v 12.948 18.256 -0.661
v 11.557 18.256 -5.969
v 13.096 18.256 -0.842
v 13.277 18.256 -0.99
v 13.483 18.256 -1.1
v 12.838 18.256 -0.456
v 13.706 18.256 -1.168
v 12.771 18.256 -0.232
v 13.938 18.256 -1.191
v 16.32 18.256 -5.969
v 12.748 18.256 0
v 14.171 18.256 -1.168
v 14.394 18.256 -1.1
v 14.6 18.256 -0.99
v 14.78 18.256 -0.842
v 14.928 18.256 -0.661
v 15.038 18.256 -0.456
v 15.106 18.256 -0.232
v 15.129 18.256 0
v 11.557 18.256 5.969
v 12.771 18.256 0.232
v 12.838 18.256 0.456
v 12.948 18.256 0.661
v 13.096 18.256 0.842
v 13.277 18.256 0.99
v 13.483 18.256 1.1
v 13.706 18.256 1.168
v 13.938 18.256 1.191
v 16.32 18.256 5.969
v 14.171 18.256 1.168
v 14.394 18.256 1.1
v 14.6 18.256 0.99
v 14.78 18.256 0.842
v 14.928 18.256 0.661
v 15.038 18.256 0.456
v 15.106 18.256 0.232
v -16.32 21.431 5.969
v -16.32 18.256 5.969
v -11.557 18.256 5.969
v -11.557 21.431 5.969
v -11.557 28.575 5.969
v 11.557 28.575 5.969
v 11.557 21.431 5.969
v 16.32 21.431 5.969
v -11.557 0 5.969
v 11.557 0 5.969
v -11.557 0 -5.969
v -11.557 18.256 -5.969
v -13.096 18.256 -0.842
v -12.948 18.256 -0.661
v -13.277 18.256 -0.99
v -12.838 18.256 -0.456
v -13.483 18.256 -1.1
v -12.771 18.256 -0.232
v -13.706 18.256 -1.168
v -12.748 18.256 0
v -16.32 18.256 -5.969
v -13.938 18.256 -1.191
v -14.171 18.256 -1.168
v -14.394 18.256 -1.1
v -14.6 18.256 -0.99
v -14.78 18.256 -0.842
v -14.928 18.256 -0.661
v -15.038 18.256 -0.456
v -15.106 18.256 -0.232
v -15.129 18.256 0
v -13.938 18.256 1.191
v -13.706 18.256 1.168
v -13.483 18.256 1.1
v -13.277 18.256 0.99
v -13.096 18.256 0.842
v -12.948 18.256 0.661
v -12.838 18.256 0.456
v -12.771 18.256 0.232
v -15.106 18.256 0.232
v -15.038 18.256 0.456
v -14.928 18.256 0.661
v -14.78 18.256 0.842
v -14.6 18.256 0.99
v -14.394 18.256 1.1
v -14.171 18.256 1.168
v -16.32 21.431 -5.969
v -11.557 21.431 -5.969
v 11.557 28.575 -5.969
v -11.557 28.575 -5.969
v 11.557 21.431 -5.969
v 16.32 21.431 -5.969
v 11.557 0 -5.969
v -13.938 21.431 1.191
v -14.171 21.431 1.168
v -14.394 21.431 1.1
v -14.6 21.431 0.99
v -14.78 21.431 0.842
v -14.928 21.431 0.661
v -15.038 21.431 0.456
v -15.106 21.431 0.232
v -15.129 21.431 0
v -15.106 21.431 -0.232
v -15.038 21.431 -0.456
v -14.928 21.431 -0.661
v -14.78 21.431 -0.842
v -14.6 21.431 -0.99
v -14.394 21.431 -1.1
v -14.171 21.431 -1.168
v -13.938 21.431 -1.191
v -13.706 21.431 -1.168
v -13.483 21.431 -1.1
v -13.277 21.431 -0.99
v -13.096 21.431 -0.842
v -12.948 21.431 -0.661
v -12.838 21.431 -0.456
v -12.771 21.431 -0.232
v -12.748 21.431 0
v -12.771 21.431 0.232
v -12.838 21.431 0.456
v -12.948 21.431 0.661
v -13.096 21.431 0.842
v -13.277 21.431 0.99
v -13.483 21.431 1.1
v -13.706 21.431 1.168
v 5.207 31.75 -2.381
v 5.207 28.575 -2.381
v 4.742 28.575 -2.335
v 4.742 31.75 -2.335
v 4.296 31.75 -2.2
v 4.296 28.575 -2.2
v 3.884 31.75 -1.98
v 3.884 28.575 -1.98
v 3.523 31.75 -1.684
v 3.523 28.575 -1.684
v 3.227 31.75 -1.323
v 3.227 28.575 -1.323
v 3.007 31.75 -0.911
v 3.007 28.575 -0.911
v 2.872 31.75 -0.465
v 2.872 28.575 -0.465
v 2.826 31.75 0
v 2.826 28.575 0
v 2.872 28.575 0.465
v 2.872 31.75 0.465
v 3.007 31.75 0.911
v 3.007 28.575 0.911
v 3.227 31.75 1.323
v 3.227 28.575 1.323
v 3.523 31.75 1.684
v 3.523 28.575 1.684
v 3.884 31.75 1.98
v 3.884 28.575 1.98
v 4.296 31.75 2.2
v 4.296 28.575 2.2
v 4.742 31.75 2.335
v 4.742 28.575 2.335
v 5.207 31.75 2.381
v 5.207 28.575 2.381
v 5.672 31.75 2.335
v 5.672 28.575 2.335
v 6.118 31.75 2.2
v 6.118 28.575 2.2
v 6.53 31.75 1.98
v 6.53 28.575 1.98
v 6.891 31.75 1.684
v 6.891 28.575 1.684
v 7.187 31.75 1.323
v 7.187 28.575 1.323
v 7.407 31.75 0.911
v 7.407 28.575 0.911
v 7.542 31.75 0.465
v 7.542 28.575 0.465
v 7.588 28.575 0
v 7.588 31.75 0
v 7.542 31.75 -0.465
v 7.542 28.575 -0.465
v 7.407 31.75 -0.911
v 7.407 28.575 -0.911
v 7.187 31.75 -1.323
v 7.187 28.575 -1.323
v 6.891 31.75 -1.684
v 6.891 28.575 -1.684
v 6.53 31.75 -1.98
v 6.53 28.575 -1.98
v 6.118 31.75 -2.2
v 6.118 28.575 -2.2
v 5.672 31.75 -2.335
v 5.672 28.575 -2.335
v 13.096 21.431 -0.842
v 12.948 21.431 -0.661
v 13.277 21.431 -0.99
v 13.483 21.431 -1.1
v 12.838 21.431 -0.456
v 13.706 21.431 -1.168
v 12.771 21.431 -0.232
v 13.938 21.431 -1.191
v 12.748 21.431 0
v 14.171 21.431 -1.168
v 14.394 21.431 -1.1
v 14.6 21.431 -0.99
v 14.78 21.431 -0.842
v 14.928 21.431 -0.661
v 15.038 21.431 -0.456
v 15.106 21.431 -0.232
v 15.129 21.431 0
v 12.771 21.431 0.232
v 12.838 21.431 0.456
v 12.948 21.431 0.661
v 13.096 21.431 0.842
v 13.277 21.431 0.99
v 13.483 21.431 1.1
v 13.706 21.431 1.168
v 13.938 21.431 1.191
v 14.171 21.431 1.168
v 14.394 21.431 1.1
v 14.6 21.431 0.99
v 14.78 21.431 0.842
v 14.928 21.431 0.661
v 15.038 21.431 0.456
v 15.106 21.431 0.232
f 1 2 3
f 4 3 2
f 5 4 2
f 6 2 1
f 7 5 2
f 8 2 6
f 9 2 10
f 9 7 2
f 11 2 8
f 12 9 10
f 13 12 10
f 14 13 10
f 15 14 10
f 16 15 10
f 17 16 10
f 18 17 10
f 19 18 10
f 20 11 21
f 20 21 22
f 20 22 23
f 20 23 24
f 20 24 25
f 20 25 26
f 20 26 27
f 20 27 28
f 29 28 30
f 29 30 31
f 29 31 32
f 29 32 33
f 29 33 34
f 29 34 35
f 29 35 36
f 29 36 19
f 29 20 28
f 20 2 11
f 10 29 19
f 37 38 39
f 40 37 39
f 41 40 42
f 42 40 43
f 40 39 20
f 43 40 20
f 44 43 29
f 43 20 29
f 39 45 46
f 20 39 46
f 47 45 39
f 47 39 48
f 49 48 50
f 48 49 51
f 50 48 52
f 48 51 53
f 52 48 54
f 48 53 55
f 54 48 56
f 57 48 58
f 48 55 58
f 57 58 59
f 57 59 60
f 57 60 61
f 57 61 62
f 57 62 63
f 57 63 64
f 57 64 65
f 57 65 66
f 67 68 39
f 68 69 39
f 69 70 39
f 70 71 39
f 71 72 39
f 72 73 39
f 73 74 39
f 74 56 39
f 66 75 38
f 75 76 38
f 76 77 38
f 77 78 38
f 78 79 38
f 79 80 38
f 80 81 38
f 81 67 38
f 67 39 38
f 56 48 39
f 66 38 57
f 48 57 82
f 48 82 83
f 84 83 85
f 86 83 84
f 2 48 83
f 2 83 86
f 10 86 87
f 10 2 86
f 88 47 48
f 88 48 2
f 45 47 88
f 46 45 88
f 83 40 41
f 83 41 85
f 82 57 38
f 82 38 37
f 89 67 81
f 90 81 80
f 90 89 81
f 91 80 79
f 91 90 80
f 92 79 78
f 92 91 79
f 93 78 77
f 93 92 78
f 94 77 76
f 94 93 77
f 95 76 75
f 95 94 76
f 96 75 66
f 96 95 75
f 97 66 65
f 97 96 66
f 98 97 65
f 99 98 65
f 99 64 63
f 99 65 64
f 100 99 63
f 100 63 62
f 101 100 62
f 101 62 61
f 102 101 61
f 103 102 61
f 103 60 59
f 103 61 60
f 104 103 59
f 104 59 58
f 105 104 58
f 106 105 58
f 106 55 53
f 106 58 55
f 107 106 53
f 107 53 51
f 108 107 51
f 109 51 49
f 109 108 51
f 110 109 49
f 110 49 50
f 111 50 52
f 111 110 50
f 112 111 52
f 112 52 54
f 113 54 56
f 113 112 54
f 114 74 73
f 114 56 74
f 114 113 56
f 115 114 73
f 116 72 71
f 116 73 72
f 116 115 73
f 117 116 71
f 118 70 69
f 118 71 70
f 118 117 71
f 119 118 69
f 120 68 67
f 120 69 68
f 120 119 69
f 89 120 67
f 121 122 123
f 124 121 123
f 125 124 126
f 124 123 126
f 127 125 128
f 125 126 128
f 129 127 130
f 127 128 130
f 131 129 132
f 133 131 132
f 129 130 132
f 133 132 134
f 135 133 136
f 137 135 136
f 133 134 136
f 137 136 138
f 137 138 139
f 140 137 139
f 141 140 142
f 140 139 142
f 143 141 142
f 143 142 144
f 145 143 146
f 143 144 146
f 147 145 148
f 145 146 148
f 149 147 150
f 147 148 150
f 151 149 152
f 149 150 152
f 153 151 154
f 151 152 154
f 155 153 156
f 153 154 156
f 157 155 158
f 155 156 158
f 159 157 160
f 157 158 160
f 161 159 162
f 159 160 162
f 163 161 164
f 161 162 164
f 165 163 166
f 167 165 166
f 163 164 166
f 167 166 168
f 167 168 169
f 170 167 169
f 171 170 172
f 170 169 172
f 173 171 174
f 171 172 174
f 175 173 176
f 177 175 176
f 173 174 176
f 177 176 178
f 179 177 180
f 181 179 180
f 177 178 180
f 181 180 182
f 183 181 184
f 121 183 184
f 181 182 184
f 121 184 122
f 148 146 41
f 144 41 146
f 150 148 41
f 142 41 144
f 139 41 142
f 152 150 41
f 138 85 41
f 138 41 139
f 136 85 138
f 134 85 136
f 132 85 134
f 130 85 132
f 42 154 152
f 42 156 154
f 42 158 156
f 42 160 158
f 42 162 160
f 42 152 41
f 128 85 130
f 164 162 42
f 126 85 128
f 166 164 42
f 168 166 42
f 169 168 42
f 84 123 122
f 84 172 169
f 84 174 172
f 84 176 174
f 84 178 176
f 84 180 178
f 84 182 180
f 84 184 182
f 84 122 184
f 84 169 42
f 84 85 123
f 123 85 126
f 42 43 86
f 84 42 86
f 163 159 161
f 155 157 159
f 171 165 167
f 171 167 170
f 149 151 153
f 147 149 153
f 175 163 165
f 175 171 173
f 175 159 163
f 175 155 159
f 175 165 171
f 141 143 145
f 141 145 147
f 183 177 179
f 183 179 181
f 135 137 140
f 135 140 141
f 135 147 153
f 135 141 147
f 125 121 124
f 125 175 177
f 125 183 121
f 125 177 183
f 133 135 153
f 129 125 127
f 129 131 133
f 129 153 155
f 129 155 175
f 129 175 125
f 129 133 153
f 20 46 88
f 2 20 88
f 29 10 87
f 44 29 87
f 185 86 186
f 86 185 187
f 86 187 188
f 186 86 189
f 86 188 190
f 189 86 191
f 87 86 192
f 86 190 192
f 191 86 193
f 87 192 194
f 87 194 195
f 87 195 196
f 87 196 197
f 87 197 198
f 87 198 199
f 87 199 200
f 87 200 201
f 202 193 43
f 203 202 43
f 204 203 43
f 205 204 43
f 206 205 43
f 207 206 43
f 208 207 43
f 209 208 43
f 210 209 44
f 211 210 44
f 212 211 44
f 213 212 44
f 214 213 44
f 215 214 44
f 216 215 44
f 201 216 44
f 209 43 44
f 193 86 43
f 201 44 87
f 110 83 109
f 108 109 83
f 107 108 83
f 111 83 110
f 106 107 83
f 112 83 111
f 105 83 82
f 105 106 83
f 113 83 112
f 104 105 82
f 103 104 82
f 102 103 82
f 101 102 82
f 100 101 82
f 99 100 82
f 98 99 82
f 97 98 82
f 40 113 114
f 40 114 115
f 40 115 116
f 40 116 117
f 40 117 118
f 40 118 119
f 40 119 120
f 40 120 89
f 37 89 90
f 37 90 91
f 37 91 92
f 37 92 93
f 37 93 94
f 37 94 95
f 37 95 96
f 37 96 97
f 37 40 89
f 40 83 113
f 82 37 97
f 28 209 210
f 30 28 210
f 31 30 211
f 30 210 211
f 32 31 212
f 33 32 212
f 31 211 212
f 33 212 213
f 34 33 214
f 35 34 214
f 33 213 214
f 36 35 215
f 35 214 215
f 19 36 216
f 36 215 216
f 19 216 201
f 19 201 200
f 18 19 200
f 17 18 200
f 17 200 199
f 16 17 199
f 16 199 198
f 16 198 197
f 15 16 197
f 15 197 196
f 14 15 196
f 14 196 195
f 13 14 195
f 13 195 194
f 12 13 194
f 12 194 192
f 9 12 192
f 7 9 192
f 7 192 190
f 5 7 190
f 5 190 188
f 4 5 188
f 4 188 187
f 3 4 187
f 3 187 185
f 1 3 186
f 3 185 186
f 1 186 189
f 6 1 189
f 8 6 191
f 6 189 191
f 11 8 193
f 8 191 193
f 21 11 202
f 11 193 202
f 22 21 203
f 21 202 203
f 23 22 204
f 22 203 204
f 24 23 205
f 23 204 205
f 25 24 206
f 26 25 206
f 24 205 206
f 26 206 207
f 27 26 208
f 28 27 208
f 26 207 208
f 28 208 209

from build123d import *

# Parameters (mm, degrees)
SKETCH2_W           = 23.114
SKETCH2_H           = 11.938
BOSS_EXTRUDE1_DEPTH = 28.575
SKETCH3_W           = 4.7625
SKETCH3_H           = 3.175
BOSS_EXTRUDE2_DEPTH = 11.938
SKETCH5_R           = 2.38125
BOSS_EXTRUDE3_DEPTH = 3.175
SKETCH8_R           = 1.190625
CUT_EXTRUDE1_DEPTH  = 28.590823072


with BuildPart() as part:
    # Sketch2 → Boss-Extrude1 (new body)
    with BuildSketch(Plane(origin=(0, 0, 0), x_dir=(1, 0, 0), z_dir=(0, 1, 0))):
        Rectangle(SKETCH2_W, SKETCH2_H)
    extrude(amount=BOSS_EXTRUDE1_DEPTH)

    # Sketch3 → Boss-Extrude2 (add, through all)
    with BuildSketch(Plane.XY.offset(5.969)):
        with Locations((13.93825, 19.84375)):
            Rectangle(SKETCH3_W, SKETCH3_H)
    boss_extrude2 = extrude(amount=-BOSS_EXTRUDE2_DEPTH)

    # Mirror1: Boss-Extrude2 across plane
    add(boss_extrude2.mirror(Plane(origin=(0, 0, 0), x_dir=(0, 0, 1), z_dir=(1, 0, 0))))

    # Sketch5 → Boss-Extrude3 (add)
    with BuildSketch(Plane(origin=(0, 28.575, 0), x_dir=(1, 0, 0), z_dir=(0, 1, 0))):
        with Locations(Location((5.207, 0, 0), (0, 0, 90))):
            Circle(SKETCH5_R)
    extrude(amount=BOSS_EXTRUDE3_DEPTH)

    # Sketch8 → Cut-Extrude1 (cut, through all)
    with BuildSketch(Plane(origin=(0, 21.43125, 0), x_dir=(1, 0, 0), z_dir=(0, 1, 0))):
        with Locations(Location((13.93825, 0, 0), (0, 0, 270))):
            Circle(SKETCH8_R)
    cut_extrude1 = extrude(amount=-CUT_EXTRUDE1_DEPTH, mode=Mode.SUBTRACT)

    # Mirror2: Cut-Extrude1 across plane
    add(cut_extrude1.mirror(Plane(origin=(0, 0, 0), x_dir=(0, 0, 1), z_dir=(1, 0, 0))), mode=Mode.SUBTRACT)


solid = part.part
